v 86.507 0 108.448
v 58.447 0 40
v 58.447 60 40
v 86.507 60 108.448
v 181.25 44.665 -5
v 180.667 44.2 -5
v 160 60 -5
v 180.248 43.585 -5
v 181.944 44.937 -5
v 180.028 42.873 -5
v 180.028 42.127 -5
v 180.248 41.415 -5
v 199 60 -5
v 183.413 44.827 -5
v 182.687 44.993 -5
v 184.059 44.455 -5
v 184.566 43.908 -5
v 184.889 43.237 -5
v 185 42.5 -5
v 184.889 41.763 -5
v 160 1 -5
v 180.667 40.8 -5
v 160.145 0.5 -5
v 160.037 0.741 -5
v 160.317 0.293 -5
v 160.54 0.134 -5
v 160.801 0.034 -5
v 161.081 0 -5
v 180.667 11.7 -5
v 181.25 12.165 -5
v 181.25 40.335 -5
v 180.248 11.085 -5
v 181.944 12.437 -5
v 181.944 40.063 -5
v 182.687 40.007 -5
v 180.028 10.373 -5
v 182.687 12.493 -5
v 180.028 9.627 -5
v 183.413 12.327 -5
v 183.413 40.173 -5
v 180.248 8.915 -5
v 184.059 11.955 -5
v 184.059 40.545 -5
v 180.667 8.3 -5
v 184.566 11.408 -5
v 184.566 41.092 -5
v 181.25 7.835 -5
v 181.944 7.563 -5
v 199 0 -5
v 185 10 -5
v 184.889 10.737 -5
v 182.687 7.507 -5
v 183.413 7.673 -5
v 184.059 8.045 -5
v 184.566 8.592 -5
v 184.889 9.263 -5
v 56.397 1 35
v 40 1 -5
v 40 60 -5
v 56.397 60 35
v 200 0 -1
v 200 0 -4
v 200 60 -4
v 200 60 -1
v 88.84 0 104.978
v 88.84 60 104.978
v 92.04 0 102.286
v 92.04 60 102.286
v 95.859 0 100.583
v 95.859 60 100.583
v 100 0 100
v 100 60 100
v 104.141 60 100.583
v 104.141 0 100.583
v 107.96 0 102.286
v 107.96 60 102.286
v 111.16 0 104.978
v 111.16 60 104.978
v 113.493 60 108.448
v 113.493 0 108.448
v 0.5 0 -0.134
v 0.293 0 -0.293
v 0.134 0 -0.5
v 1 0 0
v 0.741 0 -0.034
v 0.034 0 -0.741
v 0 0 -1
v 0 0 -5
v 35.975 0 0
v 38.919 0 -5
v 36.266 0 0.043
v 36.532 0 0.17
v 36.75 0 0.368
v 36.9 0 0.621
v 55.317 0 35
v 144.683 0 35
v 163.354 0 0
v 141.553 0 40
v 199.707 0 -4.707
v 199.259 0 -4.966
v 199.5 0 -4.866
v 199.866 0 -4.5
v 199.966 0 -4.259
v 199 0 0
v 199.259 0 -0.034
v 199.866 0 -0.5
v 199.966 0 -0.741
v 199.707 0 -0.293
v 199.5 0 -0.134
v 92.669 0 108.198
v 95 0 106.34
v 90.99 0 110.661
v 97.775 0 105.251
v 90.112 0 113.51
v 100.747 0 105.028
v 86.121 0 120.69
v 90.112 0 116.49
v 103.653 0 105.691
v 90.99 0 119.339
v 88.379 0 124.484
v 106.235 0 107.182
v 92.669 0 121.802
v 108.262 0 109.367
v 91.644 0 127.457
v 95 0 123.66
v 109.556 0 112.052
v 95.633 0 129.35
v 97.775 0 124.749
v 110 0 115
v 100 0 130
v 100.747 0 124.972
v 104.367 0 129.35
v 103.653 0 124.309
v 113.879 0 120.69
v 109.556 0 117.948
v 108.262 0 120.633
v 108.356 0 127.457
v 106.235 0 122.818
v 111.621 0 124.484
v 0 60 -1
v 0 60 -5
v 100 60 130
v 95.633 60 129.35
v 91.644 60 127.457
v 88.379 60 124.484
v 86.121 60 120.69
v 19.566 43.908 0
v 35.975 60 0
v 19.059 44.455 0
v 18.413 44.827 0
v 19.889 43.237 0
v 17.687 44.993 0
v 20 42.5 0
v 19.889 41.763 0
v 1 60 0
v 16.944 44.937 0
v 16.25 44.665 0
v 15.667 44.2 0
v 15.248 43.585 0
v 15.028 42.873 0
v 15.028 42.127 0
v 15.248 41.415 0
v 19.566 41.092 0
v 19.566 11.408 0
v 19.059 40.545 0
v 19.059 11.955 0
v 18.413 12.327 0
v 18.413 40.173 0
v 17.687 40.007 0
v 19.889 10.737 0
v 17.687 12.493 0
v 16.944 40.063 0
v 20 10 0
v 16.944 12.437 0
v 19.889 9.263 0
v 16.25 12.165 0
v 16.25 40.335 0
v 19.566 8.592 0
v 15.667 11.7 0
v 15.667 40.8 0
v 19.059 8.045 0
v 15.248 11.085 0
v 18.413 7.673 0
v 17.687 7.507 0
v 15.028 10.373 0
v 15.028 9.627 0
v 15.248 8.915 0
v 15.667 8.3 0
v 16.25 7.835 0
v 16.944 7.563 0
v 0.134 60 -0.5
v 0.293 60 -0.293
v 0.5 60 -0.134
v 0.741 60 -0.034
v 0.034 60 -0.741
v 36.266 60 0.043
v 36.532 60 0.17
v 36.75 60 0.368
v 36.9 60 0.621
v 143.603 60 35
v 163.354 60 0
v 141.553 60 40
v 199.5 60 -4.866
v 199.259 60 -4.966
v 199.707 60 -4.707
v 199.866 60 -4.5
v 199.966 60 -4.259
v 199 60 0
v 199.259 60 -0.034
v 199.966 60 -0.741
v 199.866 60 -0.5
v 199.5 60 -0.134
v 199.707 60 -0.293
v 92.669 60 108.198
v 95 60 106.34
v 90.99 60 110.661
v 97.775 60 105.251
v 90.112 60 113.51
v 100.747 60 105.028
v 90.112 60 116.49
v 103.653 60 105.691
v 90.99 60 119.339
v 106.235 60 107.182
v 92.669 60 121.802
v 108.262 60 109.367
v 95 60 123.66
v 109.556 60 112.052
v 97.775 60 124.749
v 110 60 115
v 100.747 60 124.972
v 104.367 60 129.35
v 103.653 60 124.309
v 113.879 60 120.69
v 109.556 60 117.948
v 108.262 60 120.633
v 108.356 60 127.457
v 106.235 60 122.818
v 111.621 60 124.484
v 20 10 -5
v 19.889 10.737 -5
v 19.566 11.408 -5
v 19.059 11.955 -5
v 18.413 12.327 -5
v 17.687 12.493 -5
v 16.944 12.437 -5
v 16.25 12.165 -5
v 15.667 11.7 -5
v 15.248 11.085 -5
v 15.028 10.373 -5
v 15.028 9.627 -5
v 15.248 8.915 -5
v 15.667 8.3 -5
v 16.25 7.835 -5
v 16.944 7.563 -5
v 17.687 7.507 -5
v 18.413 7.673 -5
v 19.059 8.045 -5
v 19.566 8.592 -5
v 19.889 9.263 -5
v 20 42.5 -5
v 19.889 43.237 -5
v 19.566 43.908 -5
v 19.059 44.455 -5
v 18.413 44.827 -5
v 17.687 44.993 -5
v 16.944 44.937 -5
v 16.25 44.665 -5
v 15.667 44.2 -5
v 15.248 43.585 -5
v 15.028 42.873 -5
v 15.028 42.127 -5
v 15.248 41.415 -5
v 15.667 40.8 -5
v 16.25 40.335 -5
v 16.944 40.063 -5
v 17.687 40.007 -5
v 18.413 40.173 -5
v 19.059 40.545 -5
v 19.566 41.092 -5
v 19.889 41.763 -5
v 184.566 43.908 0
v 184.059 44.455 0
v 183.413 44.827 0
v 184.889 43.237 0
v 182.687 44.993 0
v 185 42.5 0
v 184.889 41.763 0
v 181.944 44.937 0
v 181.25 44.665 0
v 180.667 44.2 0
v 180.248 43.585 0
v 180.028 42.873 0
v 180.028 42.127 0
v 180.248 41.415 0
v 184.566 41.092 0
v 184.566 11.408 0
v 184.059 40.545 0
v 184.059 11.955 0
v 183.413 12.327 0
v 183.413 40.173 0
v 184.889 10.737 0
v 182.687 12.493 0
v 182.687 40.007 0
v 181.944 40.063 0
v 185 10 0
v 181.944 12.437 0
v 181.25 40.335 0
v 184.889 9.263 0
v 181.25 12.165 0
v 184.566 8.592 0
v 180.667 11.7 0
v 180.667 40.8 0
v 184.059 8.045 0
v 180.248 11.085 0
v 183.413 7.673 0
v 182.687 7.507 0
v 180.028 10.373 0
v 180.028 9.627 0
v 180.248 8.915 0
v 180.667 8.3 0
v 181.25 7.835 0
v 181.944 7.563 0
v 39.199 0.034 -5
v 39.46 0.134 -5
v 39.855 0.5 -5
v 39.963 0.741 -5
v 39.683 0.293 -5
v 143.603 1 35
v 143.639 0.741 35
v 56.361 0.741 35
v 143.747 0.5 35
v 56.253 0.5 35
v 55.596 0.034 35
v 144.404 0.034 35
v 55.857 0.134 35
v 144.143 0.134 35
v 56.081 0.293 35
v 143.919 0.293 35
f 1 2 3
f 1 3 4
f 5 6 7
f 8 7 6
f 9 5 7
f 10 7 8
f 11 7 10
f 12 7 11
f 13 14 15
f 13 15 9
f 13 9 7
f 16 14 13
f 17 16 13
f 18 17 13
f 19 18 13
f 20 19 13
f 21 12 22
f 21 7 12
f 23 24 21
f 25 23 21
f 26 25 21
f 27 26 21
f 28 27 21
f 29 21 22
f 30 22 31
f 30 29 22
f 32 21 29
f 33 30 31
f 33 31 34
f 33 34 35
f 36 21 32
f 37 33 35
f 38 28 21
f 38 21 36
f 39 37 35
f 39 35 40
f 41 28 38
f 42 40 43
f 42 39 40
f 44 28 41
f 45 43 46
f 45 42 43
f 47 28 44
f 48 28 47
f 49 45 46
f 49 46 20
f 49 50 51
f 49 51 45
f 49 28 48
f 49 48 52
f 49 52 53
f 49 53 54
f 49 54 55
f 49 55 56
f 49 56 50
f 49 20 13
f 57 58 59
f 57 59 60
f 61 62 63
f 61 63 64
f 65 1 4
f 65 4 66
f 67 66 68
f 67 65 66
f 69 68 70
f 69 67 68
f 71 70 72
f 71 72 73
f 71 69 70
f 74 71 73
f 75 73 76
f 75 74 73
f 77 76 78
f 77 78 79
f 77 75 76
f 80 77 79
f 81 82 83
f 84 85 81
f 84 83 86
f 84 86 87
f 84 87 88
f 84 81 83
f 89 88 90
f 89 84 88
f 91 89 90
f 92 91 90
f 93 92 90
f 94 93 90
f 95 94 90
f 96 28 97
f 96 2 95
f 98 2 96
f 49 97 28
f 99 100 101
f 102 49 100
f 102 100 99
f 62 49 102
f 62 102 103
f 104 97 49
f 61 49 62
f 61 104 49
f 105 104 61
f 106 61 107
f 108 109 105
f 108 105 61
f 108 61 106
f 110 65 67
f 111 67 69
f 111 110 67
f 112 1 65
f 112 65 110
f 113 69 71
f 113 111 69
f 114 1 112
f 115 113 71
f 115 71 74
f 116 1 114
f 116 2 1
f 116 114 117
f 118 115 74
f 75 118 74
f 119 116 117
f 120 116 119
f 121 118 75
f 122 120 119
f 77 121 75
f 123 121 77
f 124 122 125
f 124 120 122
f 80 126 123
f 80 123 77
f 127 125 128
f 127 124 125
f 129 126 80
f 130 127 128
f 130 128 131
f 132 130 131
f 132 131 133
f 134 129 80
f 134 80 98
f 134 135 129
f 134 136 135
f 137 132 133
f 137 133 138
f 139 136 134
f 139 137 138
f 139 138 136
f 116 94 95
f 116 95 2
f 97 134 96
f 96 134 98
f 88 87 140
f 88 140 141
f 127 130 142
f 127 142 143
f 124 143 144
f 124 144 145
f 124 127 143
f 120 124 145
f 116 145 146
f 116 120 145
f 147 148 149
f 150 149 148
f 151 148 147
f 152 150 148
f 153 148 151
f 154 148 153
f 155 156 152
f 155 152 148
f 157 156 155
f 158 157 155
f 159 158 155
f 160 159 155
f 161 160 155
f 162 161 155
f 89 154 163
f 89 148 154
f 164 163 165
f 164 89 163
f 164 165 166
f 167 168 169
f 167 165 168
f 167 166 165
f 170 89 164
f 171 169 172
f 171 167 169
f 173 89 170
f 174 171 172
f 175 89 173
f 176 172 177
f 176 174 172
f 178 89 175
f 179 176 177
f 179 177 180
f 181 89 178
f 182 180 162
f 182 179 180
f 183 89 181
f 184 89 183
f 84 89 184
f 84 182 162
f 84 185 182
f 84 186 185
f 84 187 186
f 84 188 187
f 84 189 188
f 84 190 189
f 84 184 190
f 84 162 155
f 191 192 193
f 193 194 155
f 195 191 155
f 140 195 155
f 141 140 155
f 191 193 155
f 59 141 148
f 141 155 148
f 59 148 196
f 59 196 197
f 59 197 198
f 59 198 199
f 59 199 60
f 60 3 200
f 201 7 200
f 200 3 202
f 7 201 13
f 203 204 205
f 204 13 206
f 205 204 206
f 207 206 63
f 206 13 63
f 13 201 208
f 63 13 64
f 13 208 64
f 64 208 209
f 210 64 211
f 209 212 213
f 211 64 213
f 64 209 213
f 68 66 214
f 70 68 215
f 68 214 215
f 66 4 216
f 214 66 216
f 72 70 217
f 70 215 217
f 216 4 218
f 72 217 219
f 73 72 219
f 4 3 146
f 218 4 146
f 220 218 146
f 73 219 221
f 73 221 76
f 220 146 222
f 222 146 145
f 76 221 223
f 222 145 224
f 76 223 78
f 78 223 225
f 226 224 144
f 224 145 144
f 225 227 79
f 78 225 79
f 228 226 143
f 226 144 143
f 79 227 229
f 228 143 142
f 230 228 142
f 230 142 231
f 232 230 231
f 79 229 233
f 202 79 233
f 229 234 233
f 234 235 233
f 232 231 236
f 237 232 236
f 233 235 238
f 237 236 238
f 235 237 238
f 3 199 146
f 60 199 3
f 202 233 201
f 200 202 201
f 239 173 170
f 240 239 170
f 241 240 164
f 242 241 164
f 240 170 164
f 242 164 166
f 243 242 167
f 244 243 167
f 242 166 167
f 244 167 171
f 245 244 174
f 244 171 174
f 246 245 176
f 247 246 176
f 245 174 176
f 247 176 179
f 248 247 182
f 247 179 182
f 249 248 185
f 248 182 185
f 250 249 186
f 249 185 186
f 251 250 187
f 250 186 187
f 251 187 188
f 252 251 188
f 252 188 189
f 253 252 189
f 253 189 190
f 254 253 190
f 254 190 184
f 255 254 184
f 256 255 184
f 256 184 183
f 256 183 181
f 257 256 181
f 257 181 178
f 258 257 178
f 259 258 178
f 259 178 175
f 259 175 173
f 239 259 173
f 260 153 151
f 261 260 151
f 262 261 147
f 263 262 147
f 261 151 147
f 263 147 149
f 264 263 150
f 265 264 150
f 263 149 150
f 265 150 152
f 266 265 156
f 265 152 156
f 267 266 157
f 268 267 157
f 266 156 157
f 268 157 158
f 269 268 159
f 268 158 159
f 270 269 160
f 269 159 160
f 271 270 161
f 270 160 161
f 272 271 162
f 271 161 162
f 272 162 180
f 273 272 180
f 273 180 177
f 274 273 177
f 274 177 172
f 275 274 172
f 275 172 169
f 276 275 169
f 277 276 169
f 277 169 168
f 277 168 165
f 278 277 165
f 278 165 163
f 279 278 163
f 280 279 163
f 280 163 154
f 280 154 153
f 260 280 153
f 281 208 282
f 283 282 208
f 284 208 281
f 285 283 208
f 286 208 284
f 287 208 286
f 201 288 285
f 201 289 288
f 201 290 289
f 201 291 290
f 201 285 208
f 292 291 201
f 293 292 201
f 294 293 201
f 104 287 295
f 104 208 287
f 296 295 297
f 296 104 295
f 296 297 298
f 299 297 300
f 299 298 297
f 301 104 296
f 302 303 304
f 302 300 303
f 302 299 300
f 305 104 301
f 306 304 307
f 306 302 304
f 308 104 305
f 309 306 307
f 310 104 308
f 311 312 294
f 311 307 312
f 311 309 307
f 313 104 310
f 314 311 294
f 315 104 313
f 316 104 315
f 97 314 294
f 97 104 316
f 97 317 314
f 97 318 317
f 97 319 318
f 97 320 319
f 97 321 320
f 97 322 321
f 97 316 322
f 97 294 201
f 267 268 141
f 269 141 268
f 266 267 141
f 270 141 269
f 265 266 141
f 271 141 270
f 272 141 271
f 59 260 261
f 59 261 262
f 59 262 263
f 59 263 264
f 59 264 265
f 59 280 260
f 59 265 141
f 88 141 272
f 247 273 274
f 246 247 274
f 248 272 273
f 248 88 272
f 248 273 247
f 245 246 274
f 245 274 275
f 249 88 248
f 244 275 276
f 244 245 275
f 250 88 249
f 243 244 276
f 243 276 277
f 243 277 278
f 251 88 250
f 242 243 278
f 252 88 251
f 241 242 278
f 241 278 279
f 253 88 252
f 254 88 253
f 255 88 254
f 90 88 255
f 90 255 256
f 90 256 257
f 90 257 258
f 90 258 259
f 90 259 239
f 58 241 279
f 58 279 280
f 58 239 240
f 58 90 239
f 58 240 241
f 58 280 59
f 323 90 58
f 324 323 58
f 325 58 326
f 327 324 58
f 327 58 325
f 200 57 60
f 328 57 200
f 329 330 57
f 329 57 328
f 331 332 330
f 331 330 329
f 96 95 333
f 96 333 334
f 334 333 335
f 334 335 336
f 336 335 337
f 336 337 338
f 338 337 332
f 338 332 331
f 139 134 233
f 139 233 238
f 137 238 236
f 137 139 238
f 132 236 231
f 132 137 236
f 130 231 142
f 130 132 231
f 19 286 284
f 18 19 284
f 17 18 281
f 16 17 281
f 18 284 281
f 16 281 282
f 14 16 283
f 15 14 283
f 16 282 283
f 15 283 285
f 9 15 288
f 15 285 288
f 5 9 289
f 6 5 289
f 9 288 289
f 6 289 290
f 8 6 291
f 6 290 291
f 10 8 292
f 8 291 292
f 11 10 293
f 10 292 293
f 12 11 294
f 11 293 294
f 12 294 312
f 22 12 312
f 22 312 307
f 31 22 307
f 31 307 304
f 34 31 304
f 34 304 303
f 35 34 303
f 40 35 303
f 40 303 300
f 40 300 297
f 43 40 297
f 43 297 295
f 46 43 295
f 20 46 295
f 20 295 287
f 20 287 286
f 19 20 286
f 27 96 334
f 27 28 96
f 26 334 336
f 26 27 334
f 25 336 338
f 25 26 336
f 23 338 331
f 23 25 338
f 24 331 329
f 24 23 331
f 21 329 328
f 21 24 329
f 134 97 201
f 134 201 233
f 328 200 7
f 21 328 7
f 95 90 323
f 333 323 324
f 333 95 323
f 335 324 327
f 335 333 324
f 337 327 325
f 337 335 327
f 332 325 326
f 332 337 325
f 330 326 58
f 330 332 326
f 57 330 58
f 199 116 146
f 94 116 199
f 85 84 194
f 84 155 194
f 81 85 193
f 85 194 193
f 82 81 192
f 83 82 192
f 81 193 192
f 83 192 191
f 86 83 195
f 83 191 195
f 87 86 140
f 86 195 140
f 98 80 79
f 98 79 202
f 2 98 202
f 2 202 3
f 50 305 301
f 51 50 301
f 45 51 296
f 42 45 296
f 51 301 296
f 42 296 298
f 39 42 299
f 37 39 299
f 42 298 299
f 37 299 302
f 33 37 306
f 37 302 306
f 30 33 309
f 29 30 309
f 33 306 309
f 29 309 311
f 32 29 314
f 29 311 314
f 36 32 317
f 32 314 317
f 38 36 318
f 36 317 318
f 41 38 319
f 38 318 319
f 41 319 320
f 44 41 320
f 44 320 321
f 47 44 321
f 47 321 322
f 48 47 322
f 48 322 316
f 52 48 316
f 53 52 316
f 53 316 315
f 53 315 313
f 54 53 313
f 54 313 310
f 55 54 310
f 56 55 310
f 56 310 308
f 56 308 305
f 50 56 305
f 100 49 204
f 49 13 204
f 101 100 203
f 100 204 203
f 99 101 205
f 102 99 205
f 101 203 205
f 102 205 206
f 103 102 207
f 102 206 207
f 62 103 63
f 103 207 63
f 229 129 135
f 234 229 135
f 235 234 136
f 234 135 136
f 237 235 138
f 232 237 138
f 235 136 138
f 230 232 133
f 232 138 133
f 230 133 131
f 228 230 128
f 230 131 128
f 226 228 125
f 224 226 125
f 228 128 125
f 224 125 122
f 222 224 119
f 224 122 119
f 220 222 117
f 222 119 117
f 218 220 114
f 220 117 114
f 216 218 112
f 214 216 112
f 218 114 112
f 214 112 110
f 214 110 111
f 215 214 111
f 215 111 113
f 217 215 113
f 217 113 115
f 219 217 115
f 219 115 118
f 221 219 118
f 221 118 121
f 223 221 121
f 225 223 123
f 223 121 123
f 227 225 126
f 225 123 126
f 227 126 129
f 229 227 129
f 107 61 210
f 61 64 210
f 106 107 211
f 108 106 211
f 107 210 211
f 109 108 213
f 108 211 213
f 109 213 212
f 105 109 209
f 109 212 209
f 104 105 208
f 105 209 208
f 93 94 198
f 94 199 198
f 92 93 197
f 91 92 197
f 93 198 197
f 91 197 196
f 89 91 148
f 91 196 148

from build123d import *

# Parameters (mm, degrees)
F0_R     = 10
F1_DEPTH = 60
F2_R     = 2.5
F3_DEPTH = 5.001
F4_R     = 1


with BuildPart() as f1:
    # F0 (on Front) → F1 (new body)
    with BuildSketch(Plane.XZ):
        with BuildLine():
            ThreePointArc((86.1209118397, 120.6895440801), (85.0074372508, 114.5277053764), (86.5065387851, 108.4481678561))
            ThreePointArc((86.5065387851, 108.4481678561), (100, 100), (113.4934612149, 108.4481678561))
            ThreePointArc((113.4934612149, 108.4481678561), (114.9925627492, 114.5277053764), (113.8790881603, 120.6895440801))
            ThreePointArc((113.8790881603, 120.6895440801), (108.356340072, 127.4567885348), (100, 130))
            ThreePointArc((100, 130), (91.643659928, 127.4567885348), (86.1209118397, 120.6895440801))
        make_face()
        with Locations((100, 115)):
            Circle(F0_R, mode=Mode.SUBTRACT)
        with BuildLine():
            Line((58.4471400894, 40), (86.5065387851, 108.4481678561))
            ThreePointArc((86.5065387851, 108.4481678561), (85.0074372508, 114.5277053764), (86.1209118397, 120.6895440801))
            Line((86.1209118397, 120.6895440801), (36.6458690181, 0))
            Line((36.6458690181, 0), (0, 0))
            Line((0, 0), (0, -5))
            Line((0, -5), (40, -5))
            Line((40, -5), (56.3974578573, 35))
            Line((56.3974578573, 35), (143.6025421427, 35))
            Line((143.6025421427, 35), (160, -5))
            Line((160, -5), (200, -5))
            Line((200, -5), (200, 0))
            Line((200, 0), (163.3541309819, 0))
            Line((163.3541309819, 0), (113.8790881603, 120.6895440801))
            ThreePointArc((113.8790881603, 120.6895440801), (114.9925627492, 114.5277053764), (113.4934612149, 108.4481678561))
            Line((113.4934612149, 108.4481678561), (141.5528599106, 40))
            Line((141.5528599106, 40), (58.4471400894, 40))
        make_face()
    extrude(amount=-F1_DEPTH)

    # F2 (on face) → F3 (cut, through all)
    with BuildSketch(Plane.XY):
        with Locations((182.5, 10)):
            Circle(F2_R)
        with Locations((182.5, 42.5)):
            Circle(F2_R)
        with Locations((17.5, 10)):
            Circle(F2_R)
        with Locations((17.5, 42.5)):
            Circle(F2_R)
    extrude(amount=-F3_DEPTH, mode=Mode.SUBTRACT)

    # F4
    f4_edges = [f1.edges().sort_by_distance(p)[0] for p in [
        (200, 30, 0),
        (200, 30, -5),
        (0, 30, 0),
        (151.801271, 0, 15),
        (48.198729, 0, 15),
        (36.645869, 30, 0),
    ]]
    fillet(f4_edges, radius=F4_R)


solid = f1.part
